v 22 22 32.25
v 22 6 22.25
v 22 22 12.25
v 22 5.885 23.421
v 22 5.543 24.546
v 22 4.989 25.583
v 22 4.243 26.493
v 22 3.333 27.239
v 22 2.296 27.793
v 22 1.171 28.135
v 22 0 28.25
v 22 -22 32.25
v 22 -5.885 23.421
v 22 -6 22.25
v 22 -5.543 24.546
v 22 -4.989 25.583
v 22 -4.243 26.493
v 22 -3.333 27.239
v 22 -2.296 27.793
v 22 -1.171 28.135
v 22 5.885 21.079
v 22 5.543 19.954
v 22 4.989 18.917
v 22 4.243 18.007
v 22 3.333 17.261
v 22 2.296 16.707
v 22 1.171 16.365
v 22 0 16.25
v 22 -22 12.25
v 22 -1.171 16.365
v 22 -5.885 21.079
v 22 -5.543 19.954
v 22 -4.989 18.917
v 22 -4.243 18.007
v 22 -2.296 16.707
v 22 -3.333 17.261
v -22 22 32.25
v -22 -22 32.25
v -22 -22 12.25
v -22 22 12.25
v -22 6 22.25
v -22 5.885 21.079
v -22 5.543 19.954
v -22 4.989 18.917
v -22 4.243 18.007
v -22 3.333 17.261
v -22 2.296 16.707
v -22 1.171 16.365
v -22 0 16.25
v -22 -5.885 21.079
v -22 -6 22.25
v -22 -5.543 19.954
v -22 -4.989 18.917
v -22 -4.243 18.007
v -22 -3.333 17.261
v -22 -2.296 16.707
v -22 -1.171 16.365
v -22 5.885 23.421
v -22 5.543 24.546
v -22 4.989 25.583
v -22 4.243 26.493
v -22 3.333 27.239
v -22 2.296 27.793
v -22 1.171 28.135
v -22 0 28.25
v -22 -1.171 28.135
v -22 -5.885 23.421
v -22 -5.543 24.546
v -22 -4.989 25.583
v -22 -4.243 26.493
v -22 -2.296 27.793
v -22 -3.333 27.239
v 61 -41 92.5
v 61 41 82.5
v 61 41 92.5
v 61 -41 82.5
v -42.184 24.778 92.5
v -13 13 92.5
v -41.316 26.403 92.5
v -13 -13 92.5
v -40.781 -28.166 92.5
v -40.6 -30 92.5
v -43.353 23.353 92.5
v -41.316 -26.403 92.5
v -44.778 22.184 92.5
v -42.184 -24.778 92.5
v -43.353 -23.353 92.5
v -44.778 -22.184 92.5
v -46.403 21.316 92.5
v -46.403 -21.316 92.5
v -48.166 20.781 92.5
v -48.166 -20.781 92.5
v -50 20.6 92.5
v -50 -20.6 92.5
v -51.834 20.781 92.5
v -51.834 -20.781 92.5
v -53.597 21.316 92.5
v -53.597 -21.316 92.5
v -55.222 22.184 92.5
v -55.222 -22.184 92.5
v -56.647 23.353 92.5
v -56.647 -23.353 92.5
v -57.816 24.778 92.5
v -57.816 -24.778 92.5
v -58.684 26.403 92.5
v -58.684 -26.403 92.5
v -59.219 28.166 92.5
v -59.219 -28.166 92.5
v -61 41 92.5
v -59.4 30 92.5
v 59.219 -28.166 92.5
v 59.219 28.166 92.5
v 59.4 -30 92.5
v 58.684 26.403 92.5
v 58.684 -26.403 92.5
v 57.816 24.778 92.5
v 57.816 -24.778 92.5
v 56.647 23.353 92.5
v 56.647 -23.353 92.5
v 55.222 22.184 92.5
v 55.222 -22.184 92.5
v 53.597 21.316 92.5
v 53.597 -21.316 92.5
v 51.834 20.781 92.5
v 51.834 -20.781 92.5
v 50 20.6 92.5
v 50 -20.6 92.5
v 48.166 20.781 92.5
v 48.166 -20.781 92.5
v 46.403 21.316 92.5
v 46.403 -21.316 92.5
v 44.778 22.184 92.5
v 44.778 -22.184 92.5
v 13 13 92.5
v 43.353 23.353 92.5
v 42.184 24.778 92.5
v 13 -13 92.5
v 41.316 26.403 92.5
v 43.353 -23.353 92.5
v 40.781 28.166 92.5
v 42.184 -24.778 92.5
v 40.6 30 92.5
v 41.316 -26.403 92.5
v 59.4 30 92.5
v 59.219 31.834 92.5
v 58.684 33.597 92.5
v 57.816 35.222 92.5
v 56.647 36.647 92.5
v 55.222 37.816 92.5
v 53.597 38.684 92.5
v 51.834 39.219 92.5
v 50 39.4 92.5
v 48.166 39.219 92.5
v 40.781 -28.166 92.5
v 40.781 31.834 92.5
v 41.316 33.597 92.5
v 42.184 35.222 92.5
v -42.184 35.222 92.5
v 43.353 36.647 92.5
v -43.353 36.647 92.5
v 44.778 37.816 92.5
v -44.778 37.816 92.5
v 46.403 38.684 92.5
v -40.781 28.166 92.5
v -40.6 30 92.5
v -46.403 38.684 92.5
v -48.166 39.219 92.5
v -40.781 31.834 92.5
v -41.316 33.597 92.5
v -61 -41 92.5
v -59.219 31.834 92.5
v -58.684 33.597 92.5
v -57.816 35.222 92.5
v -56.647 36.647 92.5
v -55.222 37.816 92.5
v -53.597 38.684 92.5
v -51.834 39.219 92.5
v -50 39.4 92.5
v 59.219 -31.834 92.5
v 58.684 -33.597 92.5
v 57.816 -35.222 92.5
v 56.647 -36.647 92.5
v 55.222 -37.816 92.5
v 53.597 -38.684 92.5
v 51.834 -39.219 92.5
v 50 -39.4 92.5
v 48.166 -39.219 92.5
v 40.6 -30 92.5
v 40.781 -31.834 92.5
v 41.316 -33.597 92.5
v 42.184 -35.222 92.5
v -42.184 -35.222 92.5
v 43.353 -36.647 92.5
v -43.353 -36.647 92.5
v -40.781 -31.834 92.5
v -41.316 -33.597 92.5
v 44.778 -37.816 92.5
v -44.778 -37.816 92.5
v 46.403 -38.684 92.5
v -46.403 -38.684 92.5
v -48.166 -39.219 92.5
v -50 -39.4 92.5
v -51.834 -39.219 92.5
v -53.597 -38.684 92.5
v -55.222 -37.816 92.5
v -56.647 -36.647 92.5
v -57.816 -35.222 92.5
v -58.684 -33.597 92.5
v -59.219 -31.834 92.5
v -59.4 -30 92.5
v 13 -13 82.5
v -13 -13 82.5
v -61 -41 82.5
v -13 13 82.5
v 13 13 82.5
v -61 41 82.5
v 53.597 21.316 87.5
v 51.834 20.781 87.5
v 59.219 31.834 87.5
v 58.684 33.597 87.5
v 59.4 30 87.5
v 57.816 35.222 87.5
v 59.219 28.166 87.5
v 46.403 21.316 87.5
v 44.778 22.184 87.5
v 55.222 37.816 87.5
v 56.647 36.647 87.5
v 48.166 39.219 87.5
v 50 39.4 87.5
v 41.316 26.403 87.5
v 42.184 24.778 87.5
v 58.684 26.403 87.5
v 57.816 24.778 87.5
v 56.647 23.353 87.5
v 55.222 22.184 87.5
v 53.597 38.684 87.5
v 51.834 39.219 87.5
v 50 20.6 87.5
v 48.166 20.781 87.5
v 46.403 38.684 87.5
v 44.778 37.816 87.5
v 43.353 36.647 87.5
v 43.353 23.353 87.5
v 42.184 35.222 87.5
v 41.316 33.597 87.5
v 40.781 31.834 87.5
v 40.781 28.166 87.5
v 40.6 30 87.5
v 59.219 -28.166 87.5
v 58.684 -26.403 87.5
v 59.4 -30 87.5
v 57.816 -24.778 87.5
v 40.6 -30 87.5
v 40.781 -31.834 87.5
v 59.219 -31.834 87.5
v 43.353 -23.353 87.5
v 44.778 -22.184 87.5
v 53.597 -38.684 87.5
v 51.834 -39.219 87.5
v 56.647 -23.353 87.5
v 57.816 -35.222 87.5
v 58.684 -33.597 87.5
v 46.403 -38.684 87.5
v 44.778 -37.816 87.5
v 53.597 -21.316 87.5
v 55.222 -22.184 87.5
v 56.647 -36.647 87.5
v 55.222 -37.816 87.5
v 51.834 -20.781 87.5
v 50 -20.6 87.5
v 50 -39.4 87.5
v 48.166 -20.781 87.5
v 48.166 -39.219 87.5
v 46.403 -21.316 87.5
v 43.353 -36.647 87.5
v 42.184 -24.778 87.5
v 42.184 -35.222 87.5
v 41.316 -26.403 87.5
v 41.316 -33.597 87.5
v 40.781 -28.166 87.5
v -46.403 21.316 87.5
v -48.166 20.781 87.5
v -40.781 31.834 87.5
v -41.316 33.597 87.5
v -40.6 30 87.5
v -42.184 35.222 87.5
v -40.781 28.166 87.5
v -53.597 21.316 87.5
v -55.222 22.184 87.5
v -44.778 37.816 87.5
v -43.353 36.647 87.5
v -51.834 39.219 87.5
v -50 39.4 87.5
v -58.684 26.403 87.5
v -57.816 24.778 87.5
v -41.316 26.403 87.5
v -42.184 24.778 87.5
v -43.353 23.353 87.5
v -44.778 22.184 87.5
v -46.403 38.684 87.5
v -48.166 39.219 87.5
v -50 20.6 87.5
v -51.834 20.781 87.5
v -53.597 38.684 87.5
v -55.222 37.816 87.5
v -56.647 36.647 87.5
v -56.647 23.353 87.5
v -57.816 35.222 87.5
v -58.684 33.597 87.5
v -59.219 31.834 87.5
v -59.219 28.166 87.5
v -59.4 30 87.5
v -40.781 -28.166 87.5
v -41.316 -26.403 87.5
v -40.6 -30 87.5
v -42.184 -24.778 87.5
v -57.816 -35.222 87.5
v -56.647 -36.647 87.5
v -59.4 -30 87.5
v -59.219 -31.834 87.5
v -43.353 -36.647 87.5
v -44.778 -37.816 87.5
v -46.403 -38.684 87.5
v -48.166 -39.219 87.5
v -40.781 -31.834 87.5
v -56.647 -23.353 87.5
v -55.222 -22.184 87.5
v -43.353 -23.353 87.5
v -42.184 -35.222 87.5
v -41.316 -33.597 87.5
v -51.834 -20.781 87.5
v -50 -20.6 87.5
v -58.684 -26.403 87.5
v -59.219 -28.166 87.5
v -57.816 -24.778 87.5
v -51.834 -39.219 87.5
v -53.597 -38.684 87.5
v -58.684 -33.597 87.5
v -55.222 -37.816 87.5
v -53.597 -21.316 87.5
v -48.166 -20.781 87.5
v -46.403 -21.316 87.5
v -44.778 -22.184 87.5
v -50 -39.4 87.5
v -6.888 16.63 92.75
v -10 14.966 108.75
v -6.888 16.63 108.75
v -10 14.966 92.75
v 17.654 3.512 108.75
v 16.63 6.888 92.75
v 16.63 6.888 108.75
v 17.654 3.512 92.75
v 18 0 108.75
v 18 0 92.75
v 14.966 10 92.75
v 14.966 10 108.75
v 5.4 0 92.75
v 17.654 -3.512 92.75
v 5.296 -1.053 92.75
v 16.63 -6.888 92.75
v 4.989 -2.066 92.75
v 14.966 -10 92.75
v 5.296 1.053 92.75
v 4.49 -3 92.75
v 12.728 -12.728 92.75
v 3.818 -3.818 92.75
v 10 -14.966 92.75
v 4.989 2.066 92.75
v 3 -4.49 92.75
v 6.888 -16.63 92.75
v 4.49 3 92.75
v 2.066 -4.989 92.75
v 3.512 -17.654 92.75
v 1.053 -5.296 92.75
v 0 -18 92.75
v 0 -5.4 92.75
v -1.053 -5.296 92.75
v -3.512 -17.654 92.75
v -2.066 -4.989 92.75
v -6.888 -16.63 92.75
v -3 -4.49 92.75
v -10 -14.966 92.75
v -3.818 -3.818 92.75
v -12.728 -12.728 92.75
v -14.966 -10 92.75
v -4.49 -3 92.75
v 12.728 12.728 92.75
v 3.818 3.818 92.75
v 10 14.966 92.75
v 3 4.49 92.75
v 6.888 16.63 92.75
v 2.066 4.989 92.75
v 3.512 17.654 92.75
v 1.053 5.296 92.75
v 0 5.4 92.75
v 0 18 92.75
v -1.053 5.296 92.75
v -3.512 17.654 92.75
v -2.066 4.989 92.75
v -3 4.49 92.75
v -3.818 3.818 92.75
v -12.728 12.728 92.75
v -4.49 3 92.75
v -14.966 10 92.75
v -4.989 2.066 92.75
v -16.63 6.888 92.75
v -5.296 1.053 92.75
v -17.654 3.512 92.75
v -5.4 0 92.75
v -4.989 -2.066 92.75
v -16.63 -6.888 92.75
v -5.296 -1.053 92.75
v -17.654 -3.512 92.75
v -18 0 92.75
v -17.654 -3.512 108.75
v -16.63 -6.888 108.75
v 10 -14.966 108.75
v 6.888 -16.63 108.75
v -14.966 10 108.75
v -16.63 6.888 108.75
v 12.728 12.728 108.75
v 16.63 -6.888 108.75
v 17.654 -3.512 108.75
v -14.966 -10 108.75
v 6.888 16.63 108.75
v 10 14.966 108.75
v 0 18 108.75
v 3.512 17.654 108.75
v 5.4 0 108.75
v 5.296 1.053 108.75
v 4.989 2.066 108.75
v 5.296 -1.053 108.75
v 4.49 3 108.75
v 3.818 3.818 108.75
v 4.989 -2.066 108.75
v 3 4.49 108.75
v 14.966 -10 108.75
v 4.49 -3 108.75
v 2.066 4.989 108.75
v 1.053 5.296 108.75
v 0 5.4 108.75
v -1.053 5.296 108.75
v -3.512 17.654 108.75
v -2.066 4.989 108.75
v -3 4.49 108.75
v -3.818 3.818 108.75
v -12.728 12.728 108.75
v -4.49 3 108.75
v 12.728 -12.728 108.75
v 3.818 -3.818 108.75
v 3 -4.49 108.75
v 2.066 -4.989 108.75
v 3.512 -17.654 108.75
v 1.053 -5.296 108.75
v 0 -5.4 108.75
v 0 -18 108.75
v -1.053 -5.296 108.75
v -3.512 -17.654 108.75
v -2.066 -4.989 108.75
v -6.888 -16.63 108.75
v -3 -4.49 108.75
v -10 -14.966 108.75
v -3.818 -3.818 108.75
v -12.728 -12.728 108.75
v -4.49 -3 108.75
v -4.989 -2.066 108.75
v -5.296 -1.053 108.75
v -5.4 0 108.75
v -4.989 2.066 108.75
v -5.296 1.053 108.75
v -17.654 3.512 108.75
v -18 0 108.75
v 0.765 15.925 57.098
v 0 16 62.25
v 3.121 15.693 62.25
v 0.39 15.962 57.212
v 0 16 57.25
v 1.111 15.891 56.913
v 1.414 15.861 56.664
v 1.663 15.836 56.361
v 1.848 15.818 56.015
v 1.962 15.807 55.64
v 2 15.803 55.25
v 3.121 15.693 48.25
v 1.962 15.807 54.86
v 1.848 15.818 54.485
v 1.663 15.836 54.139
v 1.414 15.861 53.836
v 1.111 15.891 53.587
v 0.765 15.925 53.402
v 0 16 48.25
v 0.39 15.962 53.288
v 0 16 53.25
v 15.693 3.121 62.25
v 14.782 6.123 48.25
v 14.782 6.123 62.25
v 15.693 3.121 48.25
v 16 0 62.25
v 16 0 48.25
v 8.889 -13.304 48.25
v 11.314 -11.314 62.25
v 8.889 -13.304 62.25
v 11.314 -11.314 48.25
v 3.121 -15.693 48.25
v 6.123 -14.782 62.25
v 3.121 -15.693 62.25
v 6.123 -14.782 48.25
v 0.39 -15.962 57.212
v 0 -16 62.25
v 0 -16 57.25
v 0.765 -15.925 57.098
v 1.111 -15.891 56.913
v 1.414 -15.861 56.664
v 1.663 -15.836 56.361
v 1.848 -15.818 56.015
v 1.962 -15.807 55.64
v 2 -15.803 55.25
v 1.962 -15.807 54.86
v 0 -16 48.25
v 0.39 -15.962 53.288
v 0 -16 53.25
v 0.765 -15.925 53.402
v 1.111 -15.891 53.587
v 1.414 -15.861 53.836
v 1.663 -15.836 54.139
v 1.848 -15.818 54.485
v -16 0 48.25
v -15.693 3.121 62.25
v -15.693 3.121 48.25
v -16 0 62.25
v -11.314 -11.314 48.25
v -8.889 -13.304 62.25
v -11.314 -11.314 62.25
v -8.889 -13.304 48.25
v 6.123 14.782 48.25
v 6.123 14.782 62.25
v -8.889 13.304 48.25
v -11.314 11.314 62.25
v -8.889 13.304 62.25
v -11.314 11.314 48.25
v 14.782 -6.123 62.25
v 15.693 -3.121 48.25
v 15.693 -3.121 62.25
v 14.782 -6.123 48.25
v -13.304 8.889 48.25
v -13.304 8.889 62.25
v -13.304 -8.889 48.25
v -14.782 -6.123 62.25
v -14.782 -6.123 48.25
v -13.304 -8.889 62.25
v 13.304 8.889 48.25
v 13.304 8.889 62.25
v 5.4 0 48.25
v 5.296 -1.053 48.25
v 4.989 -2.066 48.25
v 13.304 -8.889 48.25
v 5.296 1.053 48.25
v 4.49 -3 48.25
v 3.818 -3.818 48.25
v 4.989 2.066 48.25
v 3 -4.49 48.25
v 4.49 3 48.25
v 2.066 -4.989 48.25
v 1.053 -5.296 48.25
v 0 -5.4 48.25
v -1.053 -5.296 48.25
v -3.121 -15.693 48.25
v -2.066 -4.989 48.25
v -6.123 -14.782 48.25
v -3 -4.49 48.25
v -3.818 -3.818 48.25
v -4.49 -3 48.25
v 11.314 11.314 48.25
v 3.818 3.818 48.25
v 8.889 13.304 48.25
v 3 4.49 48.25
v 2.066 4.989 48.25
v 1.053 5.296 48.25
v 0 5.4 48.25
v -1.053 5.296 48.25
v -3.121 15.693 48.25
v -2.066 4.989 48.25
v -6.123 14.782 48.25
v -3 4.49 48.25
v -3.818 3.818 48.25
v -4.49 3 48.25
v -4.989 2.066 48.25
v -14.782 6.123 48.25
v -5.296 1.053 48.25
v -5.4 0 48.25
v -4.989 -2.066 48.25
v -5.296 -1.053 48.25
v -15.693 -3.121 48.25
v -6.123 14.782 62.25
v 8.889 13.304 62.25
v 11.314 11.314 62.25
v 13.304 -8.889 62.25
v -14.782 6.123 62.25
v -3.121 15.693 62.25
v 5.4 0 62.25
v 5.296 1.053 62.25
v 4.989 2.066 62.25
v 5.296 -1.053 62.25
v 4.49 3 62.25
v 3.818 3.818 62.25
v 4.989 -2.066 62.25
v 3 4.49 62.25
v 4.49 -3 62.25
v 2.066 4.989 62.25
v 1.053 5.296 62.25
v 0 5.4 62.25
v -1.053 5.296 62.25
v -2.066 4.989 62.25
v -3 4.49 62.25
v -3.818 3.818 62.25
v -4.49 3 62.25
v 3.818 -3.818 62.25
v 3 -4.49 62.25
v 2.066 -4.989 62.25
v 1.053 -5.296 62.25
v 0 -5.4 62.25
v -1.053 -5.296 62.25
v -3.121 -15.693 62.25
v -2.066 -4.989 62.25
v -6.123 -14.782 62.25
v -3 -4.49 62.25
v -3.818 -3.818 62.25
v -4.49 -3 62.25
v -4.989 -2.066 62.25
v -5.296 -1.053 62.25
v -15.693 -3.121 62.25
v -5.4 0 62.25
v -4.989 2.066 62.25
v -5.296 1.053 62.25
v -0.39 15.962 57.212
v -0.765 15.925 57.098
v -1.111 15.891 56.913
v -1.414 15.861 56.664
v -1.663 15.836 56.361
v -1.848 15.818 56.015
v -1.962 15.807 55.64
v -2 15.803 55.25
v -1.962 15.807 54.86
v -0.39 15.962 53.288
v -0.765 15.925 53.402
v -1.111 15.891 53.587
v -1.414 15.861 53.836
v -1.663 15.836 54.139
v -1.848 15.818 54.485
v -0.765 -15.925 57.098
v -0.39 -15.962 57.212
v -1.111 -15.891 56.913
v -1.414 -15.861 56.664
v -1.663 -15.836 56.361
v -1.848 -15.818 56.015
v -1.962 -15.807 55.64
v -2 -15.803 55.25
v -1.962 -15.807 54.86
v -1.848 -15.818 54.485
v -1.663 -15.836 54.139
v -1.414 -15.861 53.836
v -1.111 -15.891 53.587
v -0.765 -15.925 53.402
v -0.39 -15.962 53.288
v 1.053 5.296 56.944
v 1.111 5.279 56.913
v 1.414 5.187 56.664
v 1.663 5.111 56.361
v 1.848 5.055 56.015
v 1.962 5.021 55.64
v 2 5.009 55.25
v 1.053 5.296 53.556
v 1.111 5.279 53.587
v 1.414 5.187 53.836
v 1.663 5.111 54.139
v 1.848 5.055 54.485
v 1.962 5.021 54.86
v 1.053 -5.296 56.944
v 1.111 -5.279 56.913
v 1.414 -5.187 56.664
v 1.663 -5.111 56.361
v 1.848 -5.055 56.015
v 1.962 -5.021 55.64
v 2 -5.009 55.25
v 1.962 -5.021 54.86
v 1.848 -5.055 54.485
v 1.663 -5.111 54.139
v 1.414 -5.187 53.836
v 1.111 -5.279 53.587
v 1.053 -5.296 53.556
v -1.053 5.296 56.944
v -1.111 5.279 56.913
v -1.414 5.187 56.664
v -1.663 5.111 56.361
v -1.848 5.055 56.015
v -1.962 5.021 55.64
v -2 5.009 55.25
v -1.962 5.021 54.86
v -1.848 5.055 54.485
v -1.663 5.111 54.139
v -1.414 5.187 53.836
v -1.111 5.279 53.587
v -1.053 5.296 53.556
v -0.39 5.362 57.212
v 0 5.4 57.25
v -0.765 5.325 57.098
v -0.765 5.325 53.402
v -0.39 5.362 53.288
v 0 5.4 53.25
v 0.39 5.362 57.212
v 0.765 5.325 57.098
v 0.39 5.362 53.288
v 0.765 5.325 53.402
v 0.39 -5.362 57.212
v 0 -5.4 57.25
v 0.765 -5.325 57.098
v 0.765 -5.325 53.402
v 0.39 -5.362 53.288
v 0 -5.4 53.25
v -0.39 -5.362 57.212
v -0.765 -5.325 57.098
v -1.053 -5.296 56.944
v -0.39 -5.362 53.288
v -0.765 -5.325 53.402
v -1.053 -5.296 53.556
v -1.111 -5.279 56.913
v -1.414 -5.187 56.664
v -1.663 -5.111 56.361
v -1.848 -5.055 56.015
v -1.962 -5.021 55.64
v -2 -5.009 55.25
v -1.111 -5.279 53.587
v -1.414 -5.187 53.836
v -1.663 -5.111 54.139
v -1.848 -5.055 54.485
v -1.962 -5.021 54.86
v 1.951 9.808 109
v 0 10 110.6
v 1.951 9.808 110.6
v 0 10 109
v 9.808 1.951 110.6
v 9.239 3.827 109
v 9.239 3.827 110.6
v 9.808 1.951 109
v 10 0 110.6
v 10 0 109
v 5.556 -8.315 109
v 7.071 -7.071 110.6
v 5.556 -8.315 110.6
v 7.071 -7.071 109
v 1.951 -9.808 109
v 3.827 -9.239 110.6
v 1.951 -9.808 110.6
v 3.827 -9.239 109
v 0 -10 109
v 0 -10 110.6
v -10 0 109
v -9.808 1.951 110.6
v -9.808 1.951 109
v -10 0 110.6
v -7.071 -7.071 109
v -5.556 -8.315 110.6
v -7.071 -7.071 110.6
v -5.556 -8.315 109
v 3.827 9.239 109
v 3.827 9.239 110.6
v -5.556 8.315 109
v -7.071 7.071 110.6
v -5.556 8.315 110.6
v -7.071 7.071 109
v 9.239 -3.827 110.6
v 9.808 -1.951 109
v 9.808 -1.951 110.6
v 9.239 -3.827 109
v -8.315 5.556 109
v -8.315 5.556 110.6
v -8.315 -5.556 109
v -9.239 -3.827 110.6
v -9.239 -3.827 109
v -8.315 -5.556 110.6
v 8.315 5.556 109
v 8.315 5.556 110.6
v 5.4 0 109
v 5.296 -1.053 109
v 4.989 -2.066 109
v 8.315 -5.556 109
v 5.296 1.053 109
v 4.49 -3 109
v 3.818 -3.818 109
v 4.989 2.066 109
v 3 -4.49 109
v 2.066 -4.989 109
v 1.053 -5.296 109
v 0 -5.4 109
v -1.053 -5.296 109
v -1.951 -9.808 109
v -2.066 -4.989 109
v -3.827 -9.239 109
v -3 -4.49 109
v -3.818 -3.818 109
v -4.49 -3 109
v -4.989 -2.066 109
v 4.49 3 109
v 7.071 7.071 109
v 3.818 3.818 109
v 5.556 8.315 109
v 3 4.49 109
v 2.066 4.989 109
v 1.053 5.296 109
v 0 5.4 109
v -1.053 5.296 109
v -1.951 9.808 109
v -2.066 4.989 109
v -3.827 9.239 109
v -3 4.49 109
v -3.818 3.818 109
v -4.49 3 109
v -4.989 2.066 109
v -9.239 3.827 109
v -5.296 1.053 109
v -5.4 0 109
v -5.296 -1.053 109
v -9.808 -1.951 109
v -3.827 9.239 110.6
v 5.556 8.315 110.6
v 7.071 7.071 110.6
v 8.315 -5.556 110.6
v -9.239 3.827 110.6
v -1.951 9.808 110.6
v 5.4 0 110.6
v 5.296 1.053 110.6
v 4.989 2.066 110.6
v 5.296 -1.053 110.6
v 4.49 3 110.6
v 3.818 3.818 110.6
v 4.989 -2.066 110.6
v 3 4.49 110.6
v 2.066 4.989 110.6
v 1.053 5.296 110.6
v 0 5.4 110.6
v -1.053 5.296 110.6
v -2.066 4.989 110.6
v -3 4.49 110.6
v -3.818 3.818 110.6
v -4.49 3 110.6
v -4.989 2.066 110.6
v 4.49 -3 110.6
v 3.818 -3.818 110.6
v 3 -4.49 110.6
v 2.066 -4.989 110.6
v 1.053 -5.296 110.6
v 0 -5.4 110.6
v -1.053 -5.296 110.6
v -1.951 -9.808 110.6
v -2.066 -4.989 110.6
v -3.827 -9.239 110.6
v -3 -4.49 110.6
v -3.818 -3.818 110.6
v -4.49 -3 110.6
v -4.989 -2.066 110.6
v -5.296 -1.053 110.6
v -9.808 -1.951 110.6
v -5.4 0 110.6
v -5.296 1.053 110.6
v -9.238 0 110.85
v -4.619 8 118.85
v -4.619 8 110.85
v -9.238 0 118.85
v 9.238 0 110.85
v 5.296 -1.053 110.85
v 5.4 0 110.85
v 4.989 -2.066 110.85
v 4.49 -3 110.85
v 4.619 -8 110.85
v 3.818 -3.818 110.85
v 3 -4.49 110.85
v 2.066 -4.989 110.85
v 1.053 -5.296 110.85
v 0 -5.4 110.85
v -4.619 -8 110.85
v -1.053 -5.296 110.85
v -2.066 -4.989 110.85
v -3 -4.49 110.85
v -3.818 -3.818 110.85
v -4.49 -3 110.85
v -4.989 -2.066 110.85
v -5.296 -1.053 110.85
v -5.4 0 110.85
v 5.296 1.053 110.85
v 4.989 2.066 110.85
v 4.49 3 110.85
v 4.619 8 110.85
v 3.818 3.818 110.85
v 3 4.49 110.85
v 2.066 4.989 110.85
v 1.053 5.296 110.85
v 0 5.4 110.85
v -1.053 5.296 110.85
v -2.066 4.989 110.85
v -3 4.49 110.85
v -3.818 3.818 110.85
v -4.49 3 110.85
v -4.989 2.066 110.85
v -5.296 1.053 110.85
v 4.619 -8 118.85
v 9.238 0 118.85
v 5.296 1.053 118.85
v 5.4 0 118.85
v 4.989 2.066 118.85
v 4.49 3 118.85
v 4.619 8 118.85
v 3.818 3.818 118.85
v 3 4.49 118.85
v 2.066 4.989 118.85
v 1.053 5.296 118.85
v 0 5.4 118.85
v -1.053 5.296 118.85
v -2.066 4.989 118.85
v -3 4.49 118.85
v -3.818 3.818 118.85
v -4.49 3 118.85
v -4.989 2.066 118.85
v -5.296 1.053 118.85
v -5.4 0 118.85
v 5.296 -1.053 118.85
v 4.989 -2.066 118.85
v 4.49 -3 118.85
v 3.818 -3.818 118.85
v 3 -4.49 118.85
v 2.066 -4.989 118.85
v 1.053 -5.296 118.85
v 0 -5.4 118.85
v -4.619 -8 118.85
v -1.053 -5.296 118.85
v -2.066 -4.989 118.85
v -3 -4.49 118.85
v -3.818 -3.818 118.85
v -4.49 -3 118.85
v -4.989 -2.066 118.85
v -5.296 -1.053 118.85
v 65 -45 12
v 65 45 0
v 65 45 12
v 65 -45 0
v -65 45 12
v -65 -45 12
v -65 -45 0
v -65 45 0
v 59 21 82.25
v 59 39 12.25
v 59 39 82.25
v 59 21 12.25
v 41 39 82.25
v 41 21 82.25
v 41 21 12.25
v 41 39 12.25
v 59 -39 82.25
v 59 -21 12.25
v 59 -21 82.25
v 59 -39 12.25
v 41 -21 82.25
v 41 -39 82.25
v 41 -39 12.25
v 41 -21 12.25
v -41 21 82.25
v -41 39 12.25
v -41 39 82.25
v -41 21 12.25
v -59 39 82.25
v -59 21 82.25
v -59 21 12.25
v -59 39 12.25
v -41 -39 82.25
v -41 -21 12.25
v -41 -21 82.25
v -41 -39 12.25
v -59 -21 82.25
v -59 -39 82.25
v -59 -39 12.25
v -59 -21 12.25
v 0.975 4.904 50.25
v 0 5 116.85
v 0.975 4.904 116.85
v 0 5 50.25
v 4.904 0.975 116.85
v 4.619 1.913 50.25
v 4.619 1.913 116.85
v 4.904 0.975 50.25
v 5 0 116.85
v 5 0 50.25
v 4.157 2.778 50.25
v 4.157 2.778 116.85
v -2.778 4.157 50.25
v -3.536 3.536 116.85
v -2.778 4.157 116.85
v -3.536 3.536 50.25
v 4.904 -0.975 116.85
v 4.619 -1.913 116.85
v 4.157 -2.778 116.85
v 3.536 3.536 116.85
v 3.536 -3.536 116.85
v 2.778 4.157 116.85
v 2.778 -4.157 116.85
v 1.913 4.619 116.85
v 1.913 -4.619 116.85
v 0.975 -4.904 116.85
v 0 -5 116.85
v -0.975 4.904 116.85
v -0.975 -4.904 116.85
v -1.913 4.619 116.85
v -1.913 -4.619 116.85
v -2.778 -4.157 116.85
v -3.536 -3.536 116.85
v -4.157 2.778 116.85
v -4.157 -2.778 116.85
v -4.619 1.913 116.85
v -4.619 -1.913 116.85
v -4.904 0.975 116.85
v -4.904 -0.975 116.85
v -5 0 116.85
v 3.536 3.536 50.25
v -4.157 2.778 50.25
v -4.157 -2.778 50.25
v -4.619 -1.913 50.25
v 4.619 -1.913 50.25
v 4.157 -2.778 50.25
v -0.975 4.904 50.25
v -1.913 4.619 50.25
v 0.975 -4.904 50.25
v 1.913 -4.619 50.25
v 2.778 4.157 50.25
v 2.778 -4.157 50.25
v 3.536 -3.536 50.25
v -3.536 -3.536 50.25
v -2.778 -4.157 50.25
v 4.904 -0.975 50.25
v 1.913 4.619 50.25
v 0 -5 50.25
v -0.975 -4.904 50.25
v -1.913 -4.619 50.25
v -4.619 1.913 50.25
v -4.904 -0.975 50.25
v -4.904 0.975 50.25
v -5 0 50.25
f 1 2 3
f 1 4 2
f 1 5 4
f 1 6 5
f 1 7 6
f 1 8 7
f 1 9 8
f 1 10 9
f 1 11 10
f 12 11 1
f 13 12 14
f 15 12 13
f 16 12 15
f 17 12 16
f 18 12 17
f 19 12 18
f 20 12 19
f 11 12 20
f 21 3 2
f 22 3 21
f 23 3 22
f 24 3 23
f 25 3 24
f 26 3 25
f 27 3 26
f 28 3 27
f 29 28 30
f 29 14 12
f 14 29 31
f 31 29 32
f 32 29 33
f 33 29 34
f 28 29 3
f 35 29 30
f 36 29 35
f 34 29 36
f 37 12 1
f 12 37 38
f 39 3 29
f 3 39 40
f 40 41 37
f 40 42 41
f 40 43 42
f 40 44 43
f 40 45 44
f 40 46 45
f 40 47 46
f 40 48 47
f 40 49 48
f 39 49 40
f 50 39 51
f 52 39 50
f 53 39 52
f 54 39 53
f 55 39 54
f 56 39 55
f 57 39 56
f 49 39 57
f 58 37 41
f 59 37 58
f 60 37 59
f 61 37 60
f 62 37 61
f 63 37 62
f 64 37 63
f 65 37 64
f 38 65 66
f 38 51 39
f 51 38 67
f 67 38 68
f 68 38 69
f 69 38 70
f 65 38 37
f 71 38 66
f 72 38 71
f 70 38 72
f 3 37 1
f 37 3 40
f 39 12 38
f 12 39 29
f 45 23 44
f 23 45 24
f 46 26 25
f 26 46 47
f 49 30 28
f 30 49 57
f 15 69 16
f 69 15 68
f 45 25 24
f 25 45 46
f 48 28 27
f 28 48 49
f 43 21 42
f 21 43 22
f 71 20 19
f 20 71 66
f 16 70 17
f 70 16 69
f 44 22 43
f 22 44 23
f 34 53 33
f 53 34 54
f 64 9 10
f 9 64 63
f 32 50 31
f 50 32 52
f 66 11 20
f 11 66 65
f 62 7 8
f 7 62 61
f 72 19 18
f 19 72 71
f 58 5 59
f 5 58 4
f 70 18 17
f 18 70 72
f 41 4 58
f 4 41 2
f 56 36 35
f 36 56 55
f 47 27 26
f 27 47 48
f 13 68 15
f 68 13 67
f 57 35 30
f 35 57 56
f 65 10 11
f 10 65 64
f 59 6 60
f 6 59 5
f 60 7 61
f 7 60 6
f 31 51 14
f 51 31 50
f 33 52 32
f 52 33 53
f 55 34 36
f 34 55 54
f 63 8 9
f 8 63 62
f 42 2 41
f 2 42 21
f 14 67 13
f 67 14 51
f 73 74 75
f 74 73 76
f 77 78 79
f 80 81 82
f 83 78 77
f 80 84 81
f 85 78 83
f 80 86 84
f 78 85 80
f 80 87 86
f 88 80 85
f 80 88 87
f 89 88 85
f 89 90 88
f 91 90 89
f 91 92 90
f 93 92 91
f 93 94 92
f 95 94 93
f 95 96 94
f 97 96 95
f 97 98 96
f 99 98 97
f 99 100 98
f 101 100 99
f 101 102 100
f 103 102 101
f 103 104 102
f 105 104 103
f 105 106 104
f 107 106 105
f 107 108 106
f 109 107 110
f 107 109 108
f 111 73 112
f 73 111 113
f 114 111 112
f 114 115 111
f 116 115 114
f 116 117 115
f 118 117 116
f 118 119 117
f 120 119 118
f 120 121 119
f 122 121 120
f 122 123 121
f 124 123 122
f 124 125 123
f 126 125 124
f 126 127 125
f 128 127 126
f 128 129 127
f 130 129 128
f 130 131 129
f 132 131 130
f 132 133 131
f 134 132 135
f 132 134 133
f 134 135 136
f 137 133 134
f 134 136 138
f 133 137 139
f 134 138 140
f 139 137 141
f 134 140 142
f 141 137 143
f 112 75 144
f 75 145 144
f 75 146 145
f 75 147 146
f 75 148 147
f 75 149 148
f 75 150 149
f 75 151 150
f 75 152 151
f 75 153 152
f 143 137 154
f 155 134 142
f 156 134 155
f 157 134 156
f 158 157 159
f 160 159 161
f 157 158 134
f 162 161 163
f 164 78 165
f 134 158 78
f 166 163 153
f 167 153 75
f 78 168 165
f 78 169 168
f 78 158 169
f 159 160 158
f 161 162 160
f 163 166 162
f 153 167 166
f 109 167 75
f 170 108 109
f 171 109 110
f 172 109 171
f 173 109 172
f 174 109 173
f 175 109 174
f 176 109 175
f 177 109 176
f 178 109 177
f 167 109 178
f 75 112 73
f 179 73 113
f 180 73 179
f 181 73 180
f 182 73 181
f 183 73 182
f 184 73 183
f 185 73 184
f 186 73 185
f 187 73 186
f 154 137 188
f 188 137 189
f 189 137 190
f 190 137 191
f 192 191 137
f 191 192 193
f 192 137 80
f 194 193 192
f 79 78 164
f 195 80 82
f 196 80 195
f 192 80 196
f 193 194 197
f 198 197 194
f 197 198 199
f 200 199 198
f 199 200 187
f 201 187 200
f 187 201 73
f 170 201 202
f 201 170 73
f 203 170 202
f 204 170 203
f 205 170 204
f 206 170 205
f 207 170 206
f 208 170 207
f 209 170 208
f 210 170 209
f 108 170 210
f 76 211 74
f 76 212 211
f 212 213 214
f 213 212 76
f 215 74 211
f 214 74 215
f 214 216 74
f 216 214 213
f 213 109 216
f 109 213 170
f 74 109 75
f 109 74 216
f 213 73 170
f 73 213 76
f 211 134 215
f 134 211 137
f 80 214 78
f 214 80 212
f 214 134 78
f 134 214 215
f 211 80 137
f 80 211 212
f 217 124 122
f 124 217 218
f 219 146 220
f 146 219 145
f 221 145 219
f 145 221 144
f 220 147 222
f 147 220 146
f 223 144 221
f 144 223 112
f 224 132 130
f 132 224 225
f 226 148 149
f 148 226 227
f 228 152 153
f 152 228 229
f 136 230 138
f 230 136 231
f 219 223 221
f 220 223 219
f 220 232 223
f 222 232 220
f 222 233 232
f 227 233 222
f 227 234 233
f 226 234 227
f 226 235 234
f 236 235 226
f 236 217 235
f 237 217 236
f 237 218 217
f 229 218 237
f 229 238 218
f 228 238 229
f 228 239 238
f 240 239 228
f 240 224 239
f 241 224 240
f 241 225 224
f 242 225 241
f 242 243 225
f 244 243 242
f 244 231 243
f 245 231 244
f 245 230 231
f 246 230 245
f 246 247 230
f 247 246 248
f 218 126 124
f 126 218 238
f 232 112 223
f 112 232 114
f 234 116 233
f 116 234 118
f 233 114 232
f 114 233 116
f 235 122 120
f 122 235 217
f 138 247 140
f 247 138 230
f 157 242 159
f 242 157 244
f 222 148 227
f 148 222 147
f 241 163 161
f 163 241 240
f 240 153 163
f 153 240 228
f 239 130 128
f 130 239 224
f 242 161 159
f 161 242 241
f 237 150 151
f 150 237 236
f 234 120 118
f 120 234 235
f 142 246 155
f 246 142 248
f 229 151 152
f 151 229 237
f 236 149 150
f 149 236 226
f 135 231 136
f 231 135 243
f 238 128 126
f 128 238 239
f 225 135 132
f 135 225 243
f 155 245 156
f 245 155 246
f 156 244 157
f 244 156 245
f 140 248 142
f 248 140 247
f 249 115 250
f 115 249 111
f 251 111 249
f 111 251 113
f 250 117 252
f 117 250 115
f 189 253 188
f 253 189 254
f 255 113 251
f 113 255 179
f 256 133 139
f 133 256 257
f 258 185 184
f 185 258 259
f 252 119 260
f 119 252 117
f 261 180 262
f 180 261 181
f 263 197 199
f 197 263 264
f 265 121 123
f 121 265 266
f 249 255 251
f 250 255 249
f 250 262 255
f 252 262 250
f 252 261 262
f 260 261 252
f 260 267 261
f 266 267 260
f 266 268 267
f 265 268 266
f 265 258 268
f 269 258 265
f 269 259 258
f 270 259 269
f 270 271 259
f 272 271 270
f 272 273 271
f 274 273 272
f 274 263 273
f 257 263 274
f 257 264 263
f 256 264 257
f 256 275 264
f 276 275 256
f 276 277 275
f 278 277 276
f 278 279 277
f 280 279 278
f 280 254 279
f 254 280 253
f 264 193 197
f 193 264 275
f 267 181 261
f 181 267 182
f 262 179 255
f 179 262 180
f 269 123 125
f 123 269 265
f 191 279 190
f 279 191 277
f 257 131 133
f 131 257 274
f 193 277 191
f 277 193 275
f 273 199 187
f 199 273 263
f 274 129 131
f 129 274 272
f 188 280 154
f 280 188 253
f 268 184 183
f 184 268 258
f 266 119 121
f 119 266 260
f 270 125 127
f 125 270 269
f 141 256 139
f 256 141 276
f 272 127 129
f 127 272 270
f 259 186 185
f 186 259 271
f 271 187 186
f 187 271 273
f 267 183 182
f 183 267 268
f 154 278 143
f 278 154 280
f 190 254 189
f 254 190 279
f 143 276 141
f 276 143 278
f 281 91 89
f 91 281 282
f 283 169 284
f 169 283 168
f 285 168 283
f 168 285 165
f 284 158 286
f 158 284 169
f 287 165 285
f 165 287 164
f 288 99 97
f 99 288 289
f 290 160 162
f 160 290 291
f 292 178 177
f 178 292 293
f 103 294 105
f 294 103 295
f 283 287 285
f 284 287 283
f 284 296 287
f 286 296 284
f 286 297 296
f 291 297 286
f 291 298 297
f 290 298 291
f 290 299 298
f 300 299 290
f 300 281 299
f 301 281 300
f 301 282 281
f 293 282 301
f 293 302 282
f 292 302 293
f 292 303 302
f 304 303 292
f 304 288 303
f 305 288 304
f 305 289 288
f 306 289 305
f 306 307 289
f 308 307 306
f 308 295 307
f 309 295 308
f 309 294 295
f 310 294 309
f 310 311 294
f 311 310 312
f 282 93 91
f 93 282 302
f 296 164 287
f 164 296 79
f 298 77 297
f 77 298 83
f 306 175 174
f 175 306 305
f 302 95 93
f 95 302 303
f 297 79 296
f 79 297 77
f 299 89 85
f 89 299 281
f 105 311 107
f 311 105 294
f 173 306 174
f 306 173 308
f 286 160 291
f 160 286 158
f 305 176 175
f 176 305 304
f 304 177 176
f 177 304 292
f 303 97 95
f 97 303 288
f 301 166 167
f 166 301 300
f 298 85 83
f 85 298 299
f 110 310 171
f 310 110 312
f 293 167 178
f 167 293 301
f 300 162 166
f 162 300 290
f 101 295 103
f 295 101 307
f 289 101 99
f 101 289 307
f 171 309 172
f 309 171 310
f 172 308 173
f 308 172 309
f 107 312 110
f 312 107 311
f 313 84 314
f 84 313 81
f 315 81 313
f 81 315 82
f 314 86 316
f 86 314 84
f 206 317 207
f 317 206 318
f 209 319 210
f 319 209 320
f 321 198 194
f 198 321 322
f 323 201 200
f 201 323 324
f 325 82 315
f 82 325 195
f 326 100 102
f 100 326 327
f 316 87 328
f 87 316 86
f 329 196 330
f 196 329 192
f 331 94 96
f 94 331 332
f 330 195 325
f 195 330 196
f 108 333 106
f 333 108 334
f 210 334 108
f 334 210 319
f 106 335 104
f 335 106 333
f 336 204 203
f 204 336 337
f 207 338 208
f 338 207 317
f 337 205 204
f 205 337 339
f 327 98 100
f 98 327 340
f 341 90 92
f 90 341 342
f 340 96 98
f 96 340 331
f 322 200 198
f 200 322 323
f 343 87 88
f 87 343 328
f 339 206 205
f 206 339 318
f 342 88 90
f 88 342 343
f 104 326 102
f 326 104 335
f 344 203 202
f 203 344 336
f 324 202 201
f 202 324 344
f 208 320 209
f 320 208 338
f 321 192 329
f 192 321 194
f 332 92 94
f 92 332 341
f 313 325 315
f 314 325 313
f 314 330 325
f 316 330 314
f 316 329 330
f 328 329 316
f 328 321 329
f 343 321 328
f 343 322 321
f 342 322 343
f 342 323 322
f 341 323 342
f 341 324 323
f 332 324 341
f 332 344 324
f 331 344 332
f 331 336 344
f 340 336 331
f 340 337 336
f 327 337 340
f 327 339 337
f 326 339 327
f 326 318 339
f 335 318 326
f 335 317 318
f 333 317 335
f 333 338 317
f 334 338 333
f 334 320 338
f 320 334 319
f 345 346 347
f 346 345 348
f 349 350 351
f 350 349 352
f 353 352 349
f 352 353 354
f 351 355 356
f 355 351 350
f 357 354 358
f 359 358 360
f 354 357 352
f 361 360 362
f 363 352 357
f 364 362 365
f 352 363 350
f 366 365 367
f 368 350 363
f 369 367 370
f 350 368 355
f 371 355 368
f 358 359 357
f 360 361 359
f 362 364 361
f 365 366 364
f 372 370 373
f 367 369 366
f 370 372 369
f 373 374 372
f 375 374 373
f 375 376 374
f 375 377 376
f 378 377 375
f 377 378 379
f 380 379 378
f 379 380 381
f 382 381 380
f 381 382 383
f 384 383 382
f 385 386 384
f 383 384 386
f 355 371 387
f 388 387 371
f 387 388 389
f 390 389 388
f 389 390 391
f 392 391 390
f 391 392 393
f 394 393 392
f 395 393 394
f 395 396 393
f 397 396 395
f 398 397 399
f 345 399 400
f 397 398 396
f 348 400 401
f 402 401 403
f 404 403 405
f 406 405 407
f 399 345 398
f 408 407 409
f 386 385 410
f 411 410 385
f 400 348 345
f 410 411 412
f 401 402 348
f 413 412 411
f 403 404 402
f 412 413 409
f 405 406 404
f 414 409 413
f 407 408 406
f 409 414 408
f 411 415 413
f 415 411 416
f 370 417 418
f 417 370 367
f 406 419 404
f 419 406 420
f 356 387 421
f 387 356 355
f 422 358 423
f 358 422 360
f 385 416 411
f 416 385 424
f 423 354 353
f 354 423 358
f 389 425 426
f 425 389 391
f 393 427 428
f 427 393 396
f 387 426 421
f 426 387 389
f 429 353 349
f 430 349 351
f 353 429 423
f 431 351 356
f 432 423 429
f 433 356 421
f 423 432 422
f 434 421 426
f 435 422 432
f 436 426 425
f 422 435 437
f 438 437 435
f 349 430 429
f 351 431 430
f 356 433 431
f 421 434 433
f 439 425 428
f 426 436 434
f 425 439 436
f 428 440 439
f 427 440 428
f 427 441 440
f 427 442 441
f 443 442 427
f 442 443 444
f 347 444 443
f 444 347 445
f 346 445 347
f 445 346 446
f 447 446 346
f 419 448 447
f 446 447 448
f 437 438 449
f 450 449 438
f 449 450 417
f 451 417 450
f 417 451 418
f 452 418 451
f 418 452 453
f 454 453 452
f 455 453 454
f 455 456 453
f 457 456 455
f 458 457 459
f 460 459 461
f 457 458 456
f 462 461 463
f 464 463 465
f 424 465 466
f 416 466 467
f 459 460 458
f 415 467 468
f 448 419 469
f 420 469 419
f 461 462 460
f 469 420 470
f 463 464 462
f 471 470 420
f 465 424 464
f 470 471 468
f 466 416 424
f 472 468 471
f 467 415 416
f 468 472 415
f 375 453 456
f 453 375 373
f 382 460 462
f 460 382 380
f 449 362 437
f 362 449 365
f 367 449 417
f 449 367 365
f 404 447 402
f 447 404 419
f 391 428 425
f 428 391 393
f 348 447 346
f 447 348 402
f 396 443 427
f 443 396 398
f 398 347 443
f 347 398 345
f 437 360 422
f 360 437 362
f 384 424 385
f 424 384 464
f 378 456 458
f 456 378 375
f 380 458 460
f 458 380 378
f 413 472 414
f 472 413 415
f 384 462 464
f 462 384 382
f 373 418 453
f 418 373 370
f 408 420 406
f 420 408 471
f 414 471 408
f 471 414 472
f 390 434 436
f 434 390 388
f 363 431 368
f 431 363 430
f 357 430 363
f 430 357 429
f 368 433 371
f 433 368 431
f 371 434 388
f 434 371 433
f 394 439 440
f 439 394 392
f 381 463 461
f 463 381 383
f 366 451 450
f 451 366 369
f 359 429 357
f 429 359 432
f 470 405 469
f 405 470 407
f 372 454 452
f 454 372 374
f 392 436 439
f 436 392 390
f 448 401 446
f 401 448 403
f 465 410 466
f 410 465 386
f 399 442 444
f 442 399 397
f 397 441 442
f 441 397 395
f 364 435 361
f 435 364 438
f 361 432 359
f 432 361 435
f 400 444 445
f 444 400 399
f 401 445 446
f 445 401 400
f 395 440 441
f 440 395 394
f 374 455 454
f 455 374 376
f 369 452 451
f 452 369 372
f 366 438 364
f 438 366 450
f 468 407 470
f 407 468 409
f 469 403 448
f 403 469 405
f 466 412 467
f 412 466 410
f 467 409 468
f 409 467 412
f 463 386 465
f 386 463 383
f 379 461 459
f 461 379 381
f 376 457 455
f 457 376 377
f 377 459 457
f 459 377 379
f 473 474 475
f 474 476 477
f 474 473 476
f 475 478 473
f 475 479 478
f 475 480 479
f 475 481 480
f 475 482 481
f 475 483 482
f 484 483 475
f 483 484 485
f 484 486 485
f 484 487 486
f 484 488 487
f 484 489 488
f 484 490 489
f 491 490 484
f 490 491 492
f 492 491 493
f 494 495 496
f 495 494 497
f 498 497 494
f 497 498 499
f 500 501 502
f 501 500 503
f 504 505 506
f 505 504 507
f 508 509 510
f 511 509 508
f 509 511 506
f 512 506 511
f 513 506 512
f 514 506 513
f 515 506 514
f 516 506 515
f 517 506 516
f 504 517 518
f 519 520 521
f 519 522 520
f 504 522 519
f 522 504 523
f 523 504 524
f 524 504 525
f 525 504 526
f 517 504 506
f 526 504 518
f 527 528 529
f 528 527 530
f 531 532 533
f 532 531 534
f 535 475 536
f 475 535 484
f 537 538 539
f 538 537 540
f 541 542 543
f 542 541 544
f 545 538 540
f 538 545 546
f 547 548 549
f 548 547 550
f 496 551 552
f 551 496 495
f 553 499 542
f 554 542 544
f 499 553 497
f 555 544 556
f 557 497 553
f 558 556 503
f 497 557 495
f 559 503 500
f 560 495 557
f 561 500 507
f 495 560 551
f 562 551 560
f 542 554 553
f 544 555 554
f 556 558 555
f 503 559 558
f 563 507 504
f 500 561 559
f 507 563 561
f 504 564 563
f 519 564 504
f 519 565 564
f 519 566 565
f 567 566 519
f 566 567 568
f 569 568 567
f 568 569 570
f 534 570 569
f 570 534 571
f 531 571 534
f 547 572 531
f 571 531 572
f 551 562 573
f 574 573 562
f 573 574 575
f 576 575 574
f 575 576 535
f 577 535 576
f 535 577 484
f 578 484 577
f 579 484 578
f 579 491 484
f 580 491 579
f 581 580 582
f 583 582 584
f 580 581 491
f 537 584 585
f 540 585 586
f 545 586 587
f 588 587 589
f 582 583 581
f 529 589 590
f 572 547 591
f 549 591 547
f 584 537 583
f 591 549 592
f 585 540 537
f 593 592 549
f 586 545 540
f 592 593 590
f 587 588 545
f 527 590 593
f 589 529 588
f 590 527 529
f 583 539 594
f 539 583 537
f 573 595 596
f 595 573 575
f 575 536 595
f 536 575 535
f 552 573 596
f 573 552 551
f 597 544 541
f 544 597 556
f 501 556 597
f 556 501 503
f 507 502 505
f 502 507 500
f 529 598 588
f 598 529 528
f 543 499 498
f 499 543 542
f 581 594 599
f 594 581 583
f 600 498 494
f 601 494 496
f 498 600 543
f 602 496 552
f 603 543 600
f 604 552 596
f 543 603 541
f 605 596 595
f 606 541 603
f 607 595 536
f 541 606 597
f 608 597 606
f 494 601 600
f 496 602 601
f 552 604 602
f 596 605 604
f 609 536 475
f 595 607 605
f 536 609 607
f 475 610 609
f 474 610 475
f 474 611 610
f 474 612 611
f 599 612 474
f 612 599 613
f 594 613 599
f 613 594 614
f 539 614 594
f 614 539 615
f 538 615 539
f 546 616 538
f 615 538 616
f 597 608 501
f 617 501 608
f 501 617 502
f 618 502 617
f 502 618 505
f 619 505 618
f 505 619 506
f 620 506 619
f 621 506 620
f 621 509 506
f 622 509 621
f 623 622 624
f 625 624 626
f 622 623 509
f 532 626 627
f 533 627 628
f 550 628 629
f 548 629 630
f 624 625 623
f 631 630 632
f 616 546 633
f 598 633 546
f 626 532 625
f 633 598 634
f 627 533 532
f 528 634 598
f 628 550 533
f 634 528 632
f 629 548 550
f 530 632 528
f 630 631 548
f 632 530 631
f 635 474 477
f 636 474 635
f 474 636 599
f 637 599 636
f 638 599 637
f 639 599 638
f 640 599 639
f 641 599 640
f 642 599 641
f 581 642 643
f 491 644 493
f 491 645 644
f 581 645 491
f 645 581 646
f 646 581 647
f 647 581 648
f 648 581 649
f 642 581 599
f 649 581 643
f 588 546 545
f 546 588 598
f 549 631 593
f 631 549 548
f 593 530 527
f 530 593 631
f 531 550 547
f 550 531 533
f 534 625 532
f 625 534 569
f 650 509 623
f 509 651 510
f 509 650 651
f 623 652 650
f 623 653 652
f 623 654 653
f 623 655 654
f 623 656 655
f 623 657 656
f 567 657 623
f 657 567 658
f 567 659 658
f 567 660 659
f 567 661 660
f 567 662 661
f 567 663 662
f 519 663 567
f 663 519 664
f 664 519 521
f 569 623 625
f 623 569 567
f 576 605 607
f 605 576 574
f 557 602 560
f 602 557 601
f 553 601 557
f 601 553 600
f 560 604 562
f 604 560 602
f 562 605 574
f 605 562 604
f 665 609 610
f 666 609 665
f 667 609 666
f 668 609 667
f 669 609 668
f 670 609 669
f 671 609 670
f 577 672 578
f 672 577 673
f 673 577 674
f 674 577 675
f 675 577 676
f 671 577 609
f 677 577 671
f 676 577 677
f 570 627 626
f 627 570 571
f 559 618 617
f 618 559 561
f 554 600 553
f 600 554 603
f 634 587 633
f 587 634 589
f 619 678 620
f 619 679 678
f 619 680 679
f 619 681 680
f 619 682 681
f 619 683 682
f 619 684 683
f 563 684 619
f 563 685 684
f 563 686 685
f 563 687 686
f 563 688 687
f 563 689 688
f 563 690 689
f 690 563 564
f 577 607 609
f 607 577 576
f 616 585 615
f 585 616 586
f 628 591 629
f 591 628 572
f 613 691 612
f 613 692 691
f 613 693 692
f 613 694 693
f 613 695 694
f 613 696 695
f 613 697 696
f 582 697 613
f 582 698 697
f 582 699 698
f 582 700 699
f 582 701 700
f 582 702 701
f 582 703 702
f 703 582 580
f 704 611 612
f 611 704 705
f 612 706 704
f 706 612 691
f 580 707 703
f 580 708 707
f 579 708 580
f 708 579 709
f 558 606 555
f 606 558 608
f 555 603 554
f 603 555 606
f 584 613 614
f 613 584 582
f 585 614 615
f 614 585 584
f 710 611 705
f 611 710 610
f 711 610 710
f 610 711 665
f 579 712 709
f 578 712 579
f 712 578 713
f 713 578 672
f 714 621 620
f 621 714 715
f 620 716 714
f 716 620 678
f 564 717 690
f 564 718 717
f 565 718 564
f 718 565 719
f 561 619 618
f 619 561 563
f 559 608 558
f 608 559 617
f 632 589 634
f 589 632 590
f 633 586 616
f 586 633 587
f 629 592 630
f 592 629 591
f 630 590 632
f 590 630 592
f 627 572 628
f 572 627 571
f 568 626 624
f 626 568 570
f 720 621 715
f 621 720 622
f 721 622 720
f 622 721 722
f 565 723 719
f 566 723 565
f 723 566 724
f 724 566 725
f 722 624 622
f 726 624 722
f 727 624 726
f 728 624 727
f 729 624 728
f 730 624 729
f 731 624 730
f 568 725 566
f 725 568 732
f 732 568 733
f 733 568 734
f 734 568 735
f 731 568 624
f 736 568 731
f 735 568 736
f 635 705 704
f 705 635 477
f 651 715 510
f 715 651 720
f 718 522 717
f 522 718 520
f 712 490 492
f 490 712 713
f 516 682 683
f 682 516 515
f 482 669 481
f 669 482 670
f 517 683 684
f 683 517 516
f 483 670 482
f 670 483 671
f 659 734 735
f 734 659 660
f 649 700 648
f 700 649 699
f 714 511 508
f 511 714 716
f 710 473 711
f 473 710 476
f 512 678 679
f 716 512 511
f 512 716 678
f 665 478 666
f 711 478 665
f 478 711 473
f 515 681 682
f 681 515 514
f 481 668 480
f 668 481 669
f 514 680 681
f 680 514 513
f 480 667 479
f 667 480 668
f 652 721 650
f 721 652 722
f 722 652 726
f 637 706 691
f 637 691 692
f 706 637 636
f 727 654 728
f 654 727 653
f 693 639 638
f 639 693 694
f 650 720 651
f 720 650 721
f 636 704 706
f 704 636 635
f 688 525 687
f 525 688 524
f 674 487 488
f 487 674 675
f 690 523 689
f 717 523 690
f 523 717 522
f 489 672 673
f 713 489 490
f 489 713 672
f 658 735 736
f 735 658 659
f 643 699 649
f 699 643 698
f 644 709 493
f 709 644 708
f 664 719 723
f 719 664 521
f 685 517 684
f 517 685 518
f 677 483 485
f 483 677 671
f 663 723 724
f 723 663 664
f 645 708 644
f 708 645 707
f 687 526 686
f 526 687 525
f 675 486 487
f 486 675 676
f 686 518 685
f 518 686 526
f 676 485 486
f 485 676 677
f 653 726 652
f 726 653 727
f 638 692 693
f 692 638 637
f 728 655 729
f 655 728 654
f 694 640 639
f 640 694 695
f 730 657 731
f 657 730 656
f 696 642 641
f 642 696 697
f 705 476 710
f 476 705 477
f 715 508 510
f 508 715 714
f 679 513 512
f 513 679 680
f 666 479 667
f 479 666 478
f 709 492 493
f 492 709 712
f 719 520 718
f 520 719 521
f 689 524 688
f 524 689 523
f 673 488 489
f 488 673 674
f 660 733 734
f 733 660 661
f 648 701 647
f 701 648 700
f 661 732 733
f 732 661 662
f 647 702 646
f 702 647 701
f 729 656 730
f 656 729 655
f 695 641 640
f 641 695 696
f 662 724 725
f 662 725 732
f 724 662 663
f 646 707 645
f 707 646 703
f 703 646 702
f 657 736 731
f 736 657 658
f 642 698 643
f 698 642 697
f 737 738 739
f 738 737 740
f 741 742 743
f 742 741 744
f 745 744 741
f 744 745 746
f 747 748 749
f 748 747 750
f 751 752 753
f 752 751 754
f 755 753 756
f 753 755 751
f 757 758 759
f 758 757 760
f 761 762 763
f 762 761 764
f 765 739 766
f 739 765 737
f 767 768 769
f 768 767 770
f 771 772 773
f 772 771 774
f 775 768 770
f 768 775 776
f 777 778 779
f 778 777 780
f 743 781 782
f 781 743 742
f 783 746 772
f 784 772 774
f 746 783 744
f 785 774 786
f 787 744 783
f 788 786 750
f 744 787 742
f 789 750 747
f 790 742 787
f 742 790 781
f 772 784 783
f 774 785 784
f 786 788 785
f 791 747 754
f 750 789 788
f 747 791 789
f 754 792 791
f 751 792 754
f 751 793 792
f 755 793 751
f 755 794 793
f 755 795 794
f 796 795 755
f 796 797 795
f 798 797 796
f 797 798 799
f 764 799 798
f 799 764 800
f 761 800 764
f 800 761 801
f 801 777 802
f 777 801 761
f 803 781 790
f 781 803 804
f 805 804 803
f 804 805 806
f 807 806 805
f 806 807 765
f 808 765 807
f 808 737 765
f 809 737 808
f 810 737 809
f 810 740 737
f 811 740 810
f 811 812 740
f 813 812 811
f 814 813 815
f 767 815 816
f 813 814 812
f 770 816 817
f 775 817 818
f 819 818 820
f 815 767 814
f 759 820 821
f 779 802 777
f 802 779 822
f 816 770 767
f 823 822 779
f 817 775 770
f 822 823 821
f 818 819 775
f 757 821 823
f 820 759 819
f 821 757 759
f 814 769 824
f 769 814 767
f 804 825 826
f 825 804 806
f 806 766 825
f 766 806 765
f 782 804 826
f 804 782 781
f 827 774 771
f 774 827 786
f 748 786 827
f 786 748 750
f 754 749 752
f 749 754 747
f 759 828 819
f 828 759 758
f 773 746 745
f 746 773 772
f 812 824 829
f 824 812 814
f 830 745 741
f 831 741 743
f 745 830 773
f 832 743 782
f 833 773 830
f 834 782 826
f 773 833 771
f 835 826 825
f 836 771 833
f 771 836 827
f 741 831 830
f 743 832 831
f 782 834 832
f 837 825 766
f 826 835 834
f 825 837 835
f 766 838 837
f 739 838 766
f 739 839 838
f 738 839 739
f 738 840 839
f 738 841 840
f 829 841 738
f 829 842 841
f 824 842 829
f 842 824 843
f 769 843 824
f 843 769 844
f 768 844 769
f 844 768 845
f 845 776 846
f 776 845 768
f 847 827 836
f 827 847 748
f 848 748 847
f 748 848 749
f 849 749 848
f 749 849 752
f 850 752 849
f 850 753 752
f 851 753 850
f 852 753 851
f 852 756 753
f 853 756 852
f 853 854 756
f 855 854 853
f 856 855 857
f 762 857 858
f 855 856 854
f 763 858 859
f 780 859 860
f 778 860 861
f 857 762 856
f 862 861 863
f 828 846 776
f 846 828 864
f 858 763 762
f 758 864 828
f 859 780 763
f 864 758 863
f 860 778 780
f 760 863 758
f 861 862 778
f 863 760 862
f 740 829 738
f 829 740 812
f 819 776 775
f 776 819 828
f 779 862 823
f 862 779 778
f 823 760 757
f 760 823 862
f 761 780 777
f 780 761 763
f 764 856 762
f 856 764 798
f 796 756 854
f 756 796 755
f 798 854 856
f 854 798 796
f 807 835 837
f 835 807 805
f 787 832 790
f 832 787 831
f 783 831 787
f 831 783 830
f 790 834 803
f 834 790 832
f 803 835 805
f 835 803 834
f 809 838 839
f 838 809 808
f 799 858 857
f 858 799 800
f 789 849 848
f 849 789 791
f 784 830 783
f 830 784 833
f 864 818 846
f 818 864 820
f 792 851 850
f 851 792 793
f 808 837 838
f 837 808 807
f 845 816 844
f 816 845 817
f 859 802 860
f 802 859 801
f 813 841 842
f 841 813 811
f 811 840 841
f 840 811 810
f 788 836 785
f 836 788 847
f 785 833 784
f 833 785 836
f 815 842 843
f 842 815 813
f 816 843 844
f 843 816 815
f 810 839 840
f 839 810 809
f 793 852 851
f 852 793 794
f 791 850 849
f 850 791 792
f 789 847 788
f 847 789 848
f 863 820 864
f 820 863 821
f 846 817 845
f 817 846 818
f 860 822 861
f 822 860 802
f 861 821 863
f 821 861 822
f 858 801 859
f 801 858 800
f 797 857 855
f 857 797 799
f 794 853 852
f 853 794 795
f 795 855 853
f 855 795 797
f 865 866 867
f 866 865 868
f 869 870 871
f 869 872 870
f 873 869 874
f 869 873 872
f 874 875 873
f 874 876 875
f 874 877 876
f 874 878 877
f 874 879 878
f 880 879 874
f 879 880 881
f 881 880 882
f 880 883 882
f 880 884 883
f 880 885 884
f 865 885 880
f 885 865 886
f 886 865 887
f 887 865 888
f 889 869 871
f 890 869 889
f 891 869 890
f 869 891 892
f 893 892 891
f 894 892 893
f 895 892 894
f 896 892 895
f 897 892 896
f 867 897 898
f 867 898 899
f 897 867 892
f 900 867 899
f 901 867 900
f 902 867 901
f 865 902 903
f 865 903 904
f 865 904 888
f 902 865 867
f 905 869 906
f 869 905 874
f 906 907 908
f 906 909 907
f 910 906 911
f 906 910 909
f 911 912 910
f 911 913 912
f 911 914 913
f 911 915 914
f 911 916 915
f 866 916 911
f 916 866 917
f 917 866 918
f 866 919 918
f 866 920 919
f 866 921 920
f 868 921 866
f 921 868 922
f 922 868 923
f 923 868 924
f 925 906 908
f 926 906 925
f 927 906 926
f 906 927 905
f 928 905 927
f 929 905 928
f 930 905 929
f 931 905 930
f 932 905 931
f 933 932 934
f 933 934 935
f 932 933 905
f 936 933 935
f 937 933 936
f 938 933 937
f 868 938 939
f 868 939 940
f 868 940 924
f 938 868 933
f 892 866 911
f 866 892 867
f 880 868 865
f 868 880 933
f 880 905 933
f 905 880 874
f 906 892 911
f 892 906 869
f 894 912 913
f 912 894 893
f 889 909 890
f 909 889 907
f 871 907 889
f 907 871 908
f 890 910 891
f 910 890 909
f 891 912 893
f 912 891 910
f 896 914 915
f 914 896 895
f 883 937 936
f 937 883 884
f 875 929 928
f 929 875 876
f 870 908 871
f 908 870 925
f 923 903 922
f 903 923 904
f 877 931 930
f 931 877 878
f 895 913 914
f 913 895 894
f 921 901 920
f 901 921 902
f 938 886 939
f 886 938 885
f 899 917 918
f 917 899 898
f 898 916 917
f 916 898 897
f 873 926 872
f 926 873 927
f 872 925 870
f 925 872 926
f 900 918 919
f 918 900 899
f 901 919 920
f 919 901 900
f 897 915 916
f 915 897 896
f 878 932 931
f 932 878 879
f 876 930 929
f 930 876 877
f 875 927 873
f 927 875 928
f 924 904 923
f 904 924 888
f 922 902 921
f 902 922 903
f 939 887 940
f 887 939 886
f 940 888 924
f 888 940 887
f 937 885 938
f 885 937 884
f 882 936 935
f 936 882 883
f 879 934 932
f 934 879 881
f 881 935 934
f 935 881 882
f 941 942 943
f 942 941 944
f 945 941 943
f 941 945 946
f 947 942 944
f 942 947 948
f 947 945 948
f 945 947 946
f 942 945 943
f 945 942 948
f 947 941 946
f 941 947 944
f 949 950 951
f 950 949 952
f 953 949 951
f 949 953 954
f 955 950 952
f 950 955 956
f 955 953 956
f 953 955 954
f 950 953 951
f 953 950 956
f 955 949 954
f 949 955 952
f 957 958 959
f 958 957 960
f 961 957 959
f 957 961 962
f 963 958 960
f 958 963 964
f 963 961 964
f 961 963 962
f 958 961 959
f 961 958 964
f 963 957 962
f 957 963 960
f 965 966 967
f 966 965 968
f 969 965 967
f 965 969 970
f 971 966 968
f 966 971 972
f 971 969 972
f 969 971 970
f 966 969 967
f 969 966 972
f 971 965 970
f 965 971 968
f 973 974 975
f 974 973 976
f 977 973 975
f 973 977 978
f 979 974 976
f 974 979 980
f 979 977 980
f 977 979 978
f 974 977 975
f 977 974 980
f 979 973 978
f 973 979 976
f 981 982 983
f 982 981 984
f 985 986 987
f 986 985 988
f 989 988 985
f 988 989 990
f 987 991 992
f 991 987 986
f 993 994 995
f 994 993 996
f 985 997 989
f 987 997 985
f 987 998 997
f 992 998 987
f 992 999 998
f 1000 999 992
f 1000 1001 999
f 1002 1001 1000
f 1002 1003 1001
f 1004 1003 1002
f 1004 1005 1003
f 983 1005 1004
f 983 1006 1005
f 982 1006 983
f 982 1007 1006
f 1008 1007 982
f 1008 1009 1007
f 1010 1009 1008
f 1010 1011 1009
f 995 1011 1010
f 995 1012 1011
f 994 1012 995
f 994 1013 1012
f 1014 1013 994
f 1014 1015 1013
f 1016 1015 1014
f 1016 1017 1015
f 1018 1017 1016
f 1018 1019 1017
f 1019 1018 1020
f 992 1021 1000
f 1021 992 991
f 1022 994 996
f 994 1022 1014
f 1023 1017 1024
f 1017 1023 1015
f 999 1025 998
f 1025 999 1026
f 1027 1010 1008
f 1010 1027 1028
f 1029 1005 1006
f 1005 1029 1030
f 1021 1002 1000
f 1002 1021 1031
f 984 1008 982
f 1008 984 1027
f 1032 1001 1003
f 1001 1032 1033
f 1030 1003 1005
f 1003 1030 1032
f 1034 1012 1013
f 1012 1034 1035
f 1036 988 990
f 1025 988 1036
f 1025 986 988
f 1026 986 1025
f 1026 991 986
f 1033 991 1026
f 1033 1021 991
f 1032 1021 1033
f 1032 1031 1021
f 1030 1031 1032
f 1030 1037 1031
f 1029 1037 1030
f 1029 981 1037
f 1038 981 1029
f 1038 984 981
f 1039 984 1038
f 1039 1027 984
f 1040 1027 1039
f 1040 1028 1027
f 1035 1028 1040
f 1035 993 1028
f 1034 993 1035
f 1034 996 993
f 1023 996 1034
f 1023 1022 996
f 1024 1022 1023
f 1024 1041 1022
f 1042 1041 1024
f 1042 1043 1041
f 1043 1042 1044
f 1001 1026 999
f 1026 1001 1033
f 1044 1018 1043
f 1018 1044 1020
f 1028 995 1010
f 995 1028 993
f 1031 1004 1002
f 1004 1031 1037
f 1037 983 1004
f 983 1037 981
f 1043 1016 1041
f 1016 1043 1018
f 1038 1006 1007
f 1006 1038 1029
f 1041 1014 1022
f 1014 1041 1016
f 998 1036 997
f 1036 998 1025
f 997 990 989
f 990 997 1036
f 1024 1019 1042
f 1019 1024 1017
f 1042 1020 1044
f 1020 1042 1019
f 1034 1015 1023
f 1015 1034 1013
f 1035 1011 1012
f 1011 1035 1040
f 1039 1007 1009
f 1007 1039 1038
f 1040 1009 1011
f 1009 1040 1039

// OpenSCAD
$fn = 32;

// ------------------------------------------------------------------------
// Arbor press fixture: screw d10, posts 70 mm, gap 16 mm
// Every part is its own module, assembly() places every instance.
// ------------------------------------------------------------------------

// --- part 1 ---
module press_bed() {
  difference() {
    translate([-65, -45, 0]) cube([130, 90, 12]);
  }
}

// --- part 2 ---
module anvil_block() {
  difference() {
    translate([-22, -22, 0]) cube([44, 44, 20]);
    translate([0, 0, 10]) rotate([0, 90, 0]) cylinder(h = 46, d = 12, center = true);
  }
}

// --- part 3 ---
module press_post_a() {
  translate([-9, -9, 0]) cube([18, 18, 70]);
}

// --- part 4 ---
module press_post_b() {
  translate([-9, -9, 0]) cube([18, 18, 70]);
}

// --- part 5 ---
module press_post_c() {
  translate([-9, -9, 0]) cube([18, 18, 70]);
}

// --- part 6 ---
module press_post_d() {
  translate([-9, -9, 0]) cube([18, 18, 70]);
}

// --- part 7 ---
module press_frame() {
  difference() {
    translate([-61, -41, 0]) cube([122, 82, 10]);
    translate([-13, -13, -1]) cube([26, 26, 12]);
    translate([50, 30, 5]) cylinder(h = 6, d = 18.8);
    translate([50, -30, 5]) cylinder(h = 6, d = 18.8);
    translate([-50, 30, 5]) cylinder(h = 6, d = 18.8);
    translate([-50, -30, 5]) cylinder(h = 6, d = 18.8);
  }
}

// --- part 8 ---
module guide_ring() {
  difference() {
      translate([0, 0, 0]) cylinder(h = 16, d = 36);
      translate([0, 0, -1]) cylinder(h = 18, d = 10.8);
    }
}

// --- part 9 ---
module press_screw() {
  translate([0, 0, -33.3]) cylinder(h = 66.6, d = 10);
}

// --- part 10 ---
module press_head() {
  difference() {
    cylinder(h = 14, d = 32);
    translate([0, 0, -1]) cylinder(h = 16, d = 10.8);
    translate([0, 0, 7]) rotate([90, 0, 0]) cylinder(h = 34, d = 4, center = true);
  }
}

// --- part 11 ---
module nut_washer() {
  difference() {
      translate([0, 0, 0]) cylinder(h = 1.6, d = 20);
      translate([0, 0, -1]) cylinder(h = 3.6, d = 10.8);
    }
}

// --- part 12 ---
module press_nut() {
  difference() {
    linear_extrude(height = 8) polygon(points = [[9.238, 0], [4.619, 8], [-4.619, 8], [-9.238, 0], [-4.619, -8], [4.619, -8]]);
    translate([0, 0, -1]) cylinder(h = 10, d = 10.8);
  }
}

// --- assembly ---
module assembly() {
  color([0.80, 0.24, 0.20]) translate([0, 0, 0]) rotate([0, 0, 0]) press_bed();
  color([0.20, 0.45, 0.75]) translate([0, 0, 12.25]) rotate([0, 0, 0]) anvil_block();
  color([0.25, 0.62, 0.32]) translate([50, 30, 12.25]) rotate([0, 0, 0]) press_post_a();
  color([0.92, 0.70, 0.18]) translate([50, -30, 12.25]) rotate([0, 0, 0]) press_post_b();
  color([0.58, 0.35, 0.70]) translate([-50, 30, 12.25]) rotate([0, 0, 0]) press_post_c();
  color([0.16, 0.66, 0.66]) translate([-50, -30, 12.25]) rotate([0, 0, 0]) press_post_d();
  color([0.85, 0.48, 0.18]) translate([0, 0, 82.5]) rotate([0, 0, 0]) press_frame();
  color([0.55, 0.60, 0.65]) translate([0, 0, 92.75]) rotate([0, 0, 0]) guide_ring();
  color([0.75, 0.30, 0.55]) translate([0, 0, 83.55]) rotate([0, 0, 0]) press_screw();
  color([0.42, 0.52, 0.28]) translate([0, 0, 48.25]) rotate([0, 0, 0]) press_head();
  color([0.80, 0.24, 0.20]) translate([0, 0, 109]) rotate([0, 0, 0]) nut_washer();
  color([0.20, 0.45, 0.75]) translate([0, 0, 110.85]) rotate([0, 0, 0]) press_nut();
}

assembly();
